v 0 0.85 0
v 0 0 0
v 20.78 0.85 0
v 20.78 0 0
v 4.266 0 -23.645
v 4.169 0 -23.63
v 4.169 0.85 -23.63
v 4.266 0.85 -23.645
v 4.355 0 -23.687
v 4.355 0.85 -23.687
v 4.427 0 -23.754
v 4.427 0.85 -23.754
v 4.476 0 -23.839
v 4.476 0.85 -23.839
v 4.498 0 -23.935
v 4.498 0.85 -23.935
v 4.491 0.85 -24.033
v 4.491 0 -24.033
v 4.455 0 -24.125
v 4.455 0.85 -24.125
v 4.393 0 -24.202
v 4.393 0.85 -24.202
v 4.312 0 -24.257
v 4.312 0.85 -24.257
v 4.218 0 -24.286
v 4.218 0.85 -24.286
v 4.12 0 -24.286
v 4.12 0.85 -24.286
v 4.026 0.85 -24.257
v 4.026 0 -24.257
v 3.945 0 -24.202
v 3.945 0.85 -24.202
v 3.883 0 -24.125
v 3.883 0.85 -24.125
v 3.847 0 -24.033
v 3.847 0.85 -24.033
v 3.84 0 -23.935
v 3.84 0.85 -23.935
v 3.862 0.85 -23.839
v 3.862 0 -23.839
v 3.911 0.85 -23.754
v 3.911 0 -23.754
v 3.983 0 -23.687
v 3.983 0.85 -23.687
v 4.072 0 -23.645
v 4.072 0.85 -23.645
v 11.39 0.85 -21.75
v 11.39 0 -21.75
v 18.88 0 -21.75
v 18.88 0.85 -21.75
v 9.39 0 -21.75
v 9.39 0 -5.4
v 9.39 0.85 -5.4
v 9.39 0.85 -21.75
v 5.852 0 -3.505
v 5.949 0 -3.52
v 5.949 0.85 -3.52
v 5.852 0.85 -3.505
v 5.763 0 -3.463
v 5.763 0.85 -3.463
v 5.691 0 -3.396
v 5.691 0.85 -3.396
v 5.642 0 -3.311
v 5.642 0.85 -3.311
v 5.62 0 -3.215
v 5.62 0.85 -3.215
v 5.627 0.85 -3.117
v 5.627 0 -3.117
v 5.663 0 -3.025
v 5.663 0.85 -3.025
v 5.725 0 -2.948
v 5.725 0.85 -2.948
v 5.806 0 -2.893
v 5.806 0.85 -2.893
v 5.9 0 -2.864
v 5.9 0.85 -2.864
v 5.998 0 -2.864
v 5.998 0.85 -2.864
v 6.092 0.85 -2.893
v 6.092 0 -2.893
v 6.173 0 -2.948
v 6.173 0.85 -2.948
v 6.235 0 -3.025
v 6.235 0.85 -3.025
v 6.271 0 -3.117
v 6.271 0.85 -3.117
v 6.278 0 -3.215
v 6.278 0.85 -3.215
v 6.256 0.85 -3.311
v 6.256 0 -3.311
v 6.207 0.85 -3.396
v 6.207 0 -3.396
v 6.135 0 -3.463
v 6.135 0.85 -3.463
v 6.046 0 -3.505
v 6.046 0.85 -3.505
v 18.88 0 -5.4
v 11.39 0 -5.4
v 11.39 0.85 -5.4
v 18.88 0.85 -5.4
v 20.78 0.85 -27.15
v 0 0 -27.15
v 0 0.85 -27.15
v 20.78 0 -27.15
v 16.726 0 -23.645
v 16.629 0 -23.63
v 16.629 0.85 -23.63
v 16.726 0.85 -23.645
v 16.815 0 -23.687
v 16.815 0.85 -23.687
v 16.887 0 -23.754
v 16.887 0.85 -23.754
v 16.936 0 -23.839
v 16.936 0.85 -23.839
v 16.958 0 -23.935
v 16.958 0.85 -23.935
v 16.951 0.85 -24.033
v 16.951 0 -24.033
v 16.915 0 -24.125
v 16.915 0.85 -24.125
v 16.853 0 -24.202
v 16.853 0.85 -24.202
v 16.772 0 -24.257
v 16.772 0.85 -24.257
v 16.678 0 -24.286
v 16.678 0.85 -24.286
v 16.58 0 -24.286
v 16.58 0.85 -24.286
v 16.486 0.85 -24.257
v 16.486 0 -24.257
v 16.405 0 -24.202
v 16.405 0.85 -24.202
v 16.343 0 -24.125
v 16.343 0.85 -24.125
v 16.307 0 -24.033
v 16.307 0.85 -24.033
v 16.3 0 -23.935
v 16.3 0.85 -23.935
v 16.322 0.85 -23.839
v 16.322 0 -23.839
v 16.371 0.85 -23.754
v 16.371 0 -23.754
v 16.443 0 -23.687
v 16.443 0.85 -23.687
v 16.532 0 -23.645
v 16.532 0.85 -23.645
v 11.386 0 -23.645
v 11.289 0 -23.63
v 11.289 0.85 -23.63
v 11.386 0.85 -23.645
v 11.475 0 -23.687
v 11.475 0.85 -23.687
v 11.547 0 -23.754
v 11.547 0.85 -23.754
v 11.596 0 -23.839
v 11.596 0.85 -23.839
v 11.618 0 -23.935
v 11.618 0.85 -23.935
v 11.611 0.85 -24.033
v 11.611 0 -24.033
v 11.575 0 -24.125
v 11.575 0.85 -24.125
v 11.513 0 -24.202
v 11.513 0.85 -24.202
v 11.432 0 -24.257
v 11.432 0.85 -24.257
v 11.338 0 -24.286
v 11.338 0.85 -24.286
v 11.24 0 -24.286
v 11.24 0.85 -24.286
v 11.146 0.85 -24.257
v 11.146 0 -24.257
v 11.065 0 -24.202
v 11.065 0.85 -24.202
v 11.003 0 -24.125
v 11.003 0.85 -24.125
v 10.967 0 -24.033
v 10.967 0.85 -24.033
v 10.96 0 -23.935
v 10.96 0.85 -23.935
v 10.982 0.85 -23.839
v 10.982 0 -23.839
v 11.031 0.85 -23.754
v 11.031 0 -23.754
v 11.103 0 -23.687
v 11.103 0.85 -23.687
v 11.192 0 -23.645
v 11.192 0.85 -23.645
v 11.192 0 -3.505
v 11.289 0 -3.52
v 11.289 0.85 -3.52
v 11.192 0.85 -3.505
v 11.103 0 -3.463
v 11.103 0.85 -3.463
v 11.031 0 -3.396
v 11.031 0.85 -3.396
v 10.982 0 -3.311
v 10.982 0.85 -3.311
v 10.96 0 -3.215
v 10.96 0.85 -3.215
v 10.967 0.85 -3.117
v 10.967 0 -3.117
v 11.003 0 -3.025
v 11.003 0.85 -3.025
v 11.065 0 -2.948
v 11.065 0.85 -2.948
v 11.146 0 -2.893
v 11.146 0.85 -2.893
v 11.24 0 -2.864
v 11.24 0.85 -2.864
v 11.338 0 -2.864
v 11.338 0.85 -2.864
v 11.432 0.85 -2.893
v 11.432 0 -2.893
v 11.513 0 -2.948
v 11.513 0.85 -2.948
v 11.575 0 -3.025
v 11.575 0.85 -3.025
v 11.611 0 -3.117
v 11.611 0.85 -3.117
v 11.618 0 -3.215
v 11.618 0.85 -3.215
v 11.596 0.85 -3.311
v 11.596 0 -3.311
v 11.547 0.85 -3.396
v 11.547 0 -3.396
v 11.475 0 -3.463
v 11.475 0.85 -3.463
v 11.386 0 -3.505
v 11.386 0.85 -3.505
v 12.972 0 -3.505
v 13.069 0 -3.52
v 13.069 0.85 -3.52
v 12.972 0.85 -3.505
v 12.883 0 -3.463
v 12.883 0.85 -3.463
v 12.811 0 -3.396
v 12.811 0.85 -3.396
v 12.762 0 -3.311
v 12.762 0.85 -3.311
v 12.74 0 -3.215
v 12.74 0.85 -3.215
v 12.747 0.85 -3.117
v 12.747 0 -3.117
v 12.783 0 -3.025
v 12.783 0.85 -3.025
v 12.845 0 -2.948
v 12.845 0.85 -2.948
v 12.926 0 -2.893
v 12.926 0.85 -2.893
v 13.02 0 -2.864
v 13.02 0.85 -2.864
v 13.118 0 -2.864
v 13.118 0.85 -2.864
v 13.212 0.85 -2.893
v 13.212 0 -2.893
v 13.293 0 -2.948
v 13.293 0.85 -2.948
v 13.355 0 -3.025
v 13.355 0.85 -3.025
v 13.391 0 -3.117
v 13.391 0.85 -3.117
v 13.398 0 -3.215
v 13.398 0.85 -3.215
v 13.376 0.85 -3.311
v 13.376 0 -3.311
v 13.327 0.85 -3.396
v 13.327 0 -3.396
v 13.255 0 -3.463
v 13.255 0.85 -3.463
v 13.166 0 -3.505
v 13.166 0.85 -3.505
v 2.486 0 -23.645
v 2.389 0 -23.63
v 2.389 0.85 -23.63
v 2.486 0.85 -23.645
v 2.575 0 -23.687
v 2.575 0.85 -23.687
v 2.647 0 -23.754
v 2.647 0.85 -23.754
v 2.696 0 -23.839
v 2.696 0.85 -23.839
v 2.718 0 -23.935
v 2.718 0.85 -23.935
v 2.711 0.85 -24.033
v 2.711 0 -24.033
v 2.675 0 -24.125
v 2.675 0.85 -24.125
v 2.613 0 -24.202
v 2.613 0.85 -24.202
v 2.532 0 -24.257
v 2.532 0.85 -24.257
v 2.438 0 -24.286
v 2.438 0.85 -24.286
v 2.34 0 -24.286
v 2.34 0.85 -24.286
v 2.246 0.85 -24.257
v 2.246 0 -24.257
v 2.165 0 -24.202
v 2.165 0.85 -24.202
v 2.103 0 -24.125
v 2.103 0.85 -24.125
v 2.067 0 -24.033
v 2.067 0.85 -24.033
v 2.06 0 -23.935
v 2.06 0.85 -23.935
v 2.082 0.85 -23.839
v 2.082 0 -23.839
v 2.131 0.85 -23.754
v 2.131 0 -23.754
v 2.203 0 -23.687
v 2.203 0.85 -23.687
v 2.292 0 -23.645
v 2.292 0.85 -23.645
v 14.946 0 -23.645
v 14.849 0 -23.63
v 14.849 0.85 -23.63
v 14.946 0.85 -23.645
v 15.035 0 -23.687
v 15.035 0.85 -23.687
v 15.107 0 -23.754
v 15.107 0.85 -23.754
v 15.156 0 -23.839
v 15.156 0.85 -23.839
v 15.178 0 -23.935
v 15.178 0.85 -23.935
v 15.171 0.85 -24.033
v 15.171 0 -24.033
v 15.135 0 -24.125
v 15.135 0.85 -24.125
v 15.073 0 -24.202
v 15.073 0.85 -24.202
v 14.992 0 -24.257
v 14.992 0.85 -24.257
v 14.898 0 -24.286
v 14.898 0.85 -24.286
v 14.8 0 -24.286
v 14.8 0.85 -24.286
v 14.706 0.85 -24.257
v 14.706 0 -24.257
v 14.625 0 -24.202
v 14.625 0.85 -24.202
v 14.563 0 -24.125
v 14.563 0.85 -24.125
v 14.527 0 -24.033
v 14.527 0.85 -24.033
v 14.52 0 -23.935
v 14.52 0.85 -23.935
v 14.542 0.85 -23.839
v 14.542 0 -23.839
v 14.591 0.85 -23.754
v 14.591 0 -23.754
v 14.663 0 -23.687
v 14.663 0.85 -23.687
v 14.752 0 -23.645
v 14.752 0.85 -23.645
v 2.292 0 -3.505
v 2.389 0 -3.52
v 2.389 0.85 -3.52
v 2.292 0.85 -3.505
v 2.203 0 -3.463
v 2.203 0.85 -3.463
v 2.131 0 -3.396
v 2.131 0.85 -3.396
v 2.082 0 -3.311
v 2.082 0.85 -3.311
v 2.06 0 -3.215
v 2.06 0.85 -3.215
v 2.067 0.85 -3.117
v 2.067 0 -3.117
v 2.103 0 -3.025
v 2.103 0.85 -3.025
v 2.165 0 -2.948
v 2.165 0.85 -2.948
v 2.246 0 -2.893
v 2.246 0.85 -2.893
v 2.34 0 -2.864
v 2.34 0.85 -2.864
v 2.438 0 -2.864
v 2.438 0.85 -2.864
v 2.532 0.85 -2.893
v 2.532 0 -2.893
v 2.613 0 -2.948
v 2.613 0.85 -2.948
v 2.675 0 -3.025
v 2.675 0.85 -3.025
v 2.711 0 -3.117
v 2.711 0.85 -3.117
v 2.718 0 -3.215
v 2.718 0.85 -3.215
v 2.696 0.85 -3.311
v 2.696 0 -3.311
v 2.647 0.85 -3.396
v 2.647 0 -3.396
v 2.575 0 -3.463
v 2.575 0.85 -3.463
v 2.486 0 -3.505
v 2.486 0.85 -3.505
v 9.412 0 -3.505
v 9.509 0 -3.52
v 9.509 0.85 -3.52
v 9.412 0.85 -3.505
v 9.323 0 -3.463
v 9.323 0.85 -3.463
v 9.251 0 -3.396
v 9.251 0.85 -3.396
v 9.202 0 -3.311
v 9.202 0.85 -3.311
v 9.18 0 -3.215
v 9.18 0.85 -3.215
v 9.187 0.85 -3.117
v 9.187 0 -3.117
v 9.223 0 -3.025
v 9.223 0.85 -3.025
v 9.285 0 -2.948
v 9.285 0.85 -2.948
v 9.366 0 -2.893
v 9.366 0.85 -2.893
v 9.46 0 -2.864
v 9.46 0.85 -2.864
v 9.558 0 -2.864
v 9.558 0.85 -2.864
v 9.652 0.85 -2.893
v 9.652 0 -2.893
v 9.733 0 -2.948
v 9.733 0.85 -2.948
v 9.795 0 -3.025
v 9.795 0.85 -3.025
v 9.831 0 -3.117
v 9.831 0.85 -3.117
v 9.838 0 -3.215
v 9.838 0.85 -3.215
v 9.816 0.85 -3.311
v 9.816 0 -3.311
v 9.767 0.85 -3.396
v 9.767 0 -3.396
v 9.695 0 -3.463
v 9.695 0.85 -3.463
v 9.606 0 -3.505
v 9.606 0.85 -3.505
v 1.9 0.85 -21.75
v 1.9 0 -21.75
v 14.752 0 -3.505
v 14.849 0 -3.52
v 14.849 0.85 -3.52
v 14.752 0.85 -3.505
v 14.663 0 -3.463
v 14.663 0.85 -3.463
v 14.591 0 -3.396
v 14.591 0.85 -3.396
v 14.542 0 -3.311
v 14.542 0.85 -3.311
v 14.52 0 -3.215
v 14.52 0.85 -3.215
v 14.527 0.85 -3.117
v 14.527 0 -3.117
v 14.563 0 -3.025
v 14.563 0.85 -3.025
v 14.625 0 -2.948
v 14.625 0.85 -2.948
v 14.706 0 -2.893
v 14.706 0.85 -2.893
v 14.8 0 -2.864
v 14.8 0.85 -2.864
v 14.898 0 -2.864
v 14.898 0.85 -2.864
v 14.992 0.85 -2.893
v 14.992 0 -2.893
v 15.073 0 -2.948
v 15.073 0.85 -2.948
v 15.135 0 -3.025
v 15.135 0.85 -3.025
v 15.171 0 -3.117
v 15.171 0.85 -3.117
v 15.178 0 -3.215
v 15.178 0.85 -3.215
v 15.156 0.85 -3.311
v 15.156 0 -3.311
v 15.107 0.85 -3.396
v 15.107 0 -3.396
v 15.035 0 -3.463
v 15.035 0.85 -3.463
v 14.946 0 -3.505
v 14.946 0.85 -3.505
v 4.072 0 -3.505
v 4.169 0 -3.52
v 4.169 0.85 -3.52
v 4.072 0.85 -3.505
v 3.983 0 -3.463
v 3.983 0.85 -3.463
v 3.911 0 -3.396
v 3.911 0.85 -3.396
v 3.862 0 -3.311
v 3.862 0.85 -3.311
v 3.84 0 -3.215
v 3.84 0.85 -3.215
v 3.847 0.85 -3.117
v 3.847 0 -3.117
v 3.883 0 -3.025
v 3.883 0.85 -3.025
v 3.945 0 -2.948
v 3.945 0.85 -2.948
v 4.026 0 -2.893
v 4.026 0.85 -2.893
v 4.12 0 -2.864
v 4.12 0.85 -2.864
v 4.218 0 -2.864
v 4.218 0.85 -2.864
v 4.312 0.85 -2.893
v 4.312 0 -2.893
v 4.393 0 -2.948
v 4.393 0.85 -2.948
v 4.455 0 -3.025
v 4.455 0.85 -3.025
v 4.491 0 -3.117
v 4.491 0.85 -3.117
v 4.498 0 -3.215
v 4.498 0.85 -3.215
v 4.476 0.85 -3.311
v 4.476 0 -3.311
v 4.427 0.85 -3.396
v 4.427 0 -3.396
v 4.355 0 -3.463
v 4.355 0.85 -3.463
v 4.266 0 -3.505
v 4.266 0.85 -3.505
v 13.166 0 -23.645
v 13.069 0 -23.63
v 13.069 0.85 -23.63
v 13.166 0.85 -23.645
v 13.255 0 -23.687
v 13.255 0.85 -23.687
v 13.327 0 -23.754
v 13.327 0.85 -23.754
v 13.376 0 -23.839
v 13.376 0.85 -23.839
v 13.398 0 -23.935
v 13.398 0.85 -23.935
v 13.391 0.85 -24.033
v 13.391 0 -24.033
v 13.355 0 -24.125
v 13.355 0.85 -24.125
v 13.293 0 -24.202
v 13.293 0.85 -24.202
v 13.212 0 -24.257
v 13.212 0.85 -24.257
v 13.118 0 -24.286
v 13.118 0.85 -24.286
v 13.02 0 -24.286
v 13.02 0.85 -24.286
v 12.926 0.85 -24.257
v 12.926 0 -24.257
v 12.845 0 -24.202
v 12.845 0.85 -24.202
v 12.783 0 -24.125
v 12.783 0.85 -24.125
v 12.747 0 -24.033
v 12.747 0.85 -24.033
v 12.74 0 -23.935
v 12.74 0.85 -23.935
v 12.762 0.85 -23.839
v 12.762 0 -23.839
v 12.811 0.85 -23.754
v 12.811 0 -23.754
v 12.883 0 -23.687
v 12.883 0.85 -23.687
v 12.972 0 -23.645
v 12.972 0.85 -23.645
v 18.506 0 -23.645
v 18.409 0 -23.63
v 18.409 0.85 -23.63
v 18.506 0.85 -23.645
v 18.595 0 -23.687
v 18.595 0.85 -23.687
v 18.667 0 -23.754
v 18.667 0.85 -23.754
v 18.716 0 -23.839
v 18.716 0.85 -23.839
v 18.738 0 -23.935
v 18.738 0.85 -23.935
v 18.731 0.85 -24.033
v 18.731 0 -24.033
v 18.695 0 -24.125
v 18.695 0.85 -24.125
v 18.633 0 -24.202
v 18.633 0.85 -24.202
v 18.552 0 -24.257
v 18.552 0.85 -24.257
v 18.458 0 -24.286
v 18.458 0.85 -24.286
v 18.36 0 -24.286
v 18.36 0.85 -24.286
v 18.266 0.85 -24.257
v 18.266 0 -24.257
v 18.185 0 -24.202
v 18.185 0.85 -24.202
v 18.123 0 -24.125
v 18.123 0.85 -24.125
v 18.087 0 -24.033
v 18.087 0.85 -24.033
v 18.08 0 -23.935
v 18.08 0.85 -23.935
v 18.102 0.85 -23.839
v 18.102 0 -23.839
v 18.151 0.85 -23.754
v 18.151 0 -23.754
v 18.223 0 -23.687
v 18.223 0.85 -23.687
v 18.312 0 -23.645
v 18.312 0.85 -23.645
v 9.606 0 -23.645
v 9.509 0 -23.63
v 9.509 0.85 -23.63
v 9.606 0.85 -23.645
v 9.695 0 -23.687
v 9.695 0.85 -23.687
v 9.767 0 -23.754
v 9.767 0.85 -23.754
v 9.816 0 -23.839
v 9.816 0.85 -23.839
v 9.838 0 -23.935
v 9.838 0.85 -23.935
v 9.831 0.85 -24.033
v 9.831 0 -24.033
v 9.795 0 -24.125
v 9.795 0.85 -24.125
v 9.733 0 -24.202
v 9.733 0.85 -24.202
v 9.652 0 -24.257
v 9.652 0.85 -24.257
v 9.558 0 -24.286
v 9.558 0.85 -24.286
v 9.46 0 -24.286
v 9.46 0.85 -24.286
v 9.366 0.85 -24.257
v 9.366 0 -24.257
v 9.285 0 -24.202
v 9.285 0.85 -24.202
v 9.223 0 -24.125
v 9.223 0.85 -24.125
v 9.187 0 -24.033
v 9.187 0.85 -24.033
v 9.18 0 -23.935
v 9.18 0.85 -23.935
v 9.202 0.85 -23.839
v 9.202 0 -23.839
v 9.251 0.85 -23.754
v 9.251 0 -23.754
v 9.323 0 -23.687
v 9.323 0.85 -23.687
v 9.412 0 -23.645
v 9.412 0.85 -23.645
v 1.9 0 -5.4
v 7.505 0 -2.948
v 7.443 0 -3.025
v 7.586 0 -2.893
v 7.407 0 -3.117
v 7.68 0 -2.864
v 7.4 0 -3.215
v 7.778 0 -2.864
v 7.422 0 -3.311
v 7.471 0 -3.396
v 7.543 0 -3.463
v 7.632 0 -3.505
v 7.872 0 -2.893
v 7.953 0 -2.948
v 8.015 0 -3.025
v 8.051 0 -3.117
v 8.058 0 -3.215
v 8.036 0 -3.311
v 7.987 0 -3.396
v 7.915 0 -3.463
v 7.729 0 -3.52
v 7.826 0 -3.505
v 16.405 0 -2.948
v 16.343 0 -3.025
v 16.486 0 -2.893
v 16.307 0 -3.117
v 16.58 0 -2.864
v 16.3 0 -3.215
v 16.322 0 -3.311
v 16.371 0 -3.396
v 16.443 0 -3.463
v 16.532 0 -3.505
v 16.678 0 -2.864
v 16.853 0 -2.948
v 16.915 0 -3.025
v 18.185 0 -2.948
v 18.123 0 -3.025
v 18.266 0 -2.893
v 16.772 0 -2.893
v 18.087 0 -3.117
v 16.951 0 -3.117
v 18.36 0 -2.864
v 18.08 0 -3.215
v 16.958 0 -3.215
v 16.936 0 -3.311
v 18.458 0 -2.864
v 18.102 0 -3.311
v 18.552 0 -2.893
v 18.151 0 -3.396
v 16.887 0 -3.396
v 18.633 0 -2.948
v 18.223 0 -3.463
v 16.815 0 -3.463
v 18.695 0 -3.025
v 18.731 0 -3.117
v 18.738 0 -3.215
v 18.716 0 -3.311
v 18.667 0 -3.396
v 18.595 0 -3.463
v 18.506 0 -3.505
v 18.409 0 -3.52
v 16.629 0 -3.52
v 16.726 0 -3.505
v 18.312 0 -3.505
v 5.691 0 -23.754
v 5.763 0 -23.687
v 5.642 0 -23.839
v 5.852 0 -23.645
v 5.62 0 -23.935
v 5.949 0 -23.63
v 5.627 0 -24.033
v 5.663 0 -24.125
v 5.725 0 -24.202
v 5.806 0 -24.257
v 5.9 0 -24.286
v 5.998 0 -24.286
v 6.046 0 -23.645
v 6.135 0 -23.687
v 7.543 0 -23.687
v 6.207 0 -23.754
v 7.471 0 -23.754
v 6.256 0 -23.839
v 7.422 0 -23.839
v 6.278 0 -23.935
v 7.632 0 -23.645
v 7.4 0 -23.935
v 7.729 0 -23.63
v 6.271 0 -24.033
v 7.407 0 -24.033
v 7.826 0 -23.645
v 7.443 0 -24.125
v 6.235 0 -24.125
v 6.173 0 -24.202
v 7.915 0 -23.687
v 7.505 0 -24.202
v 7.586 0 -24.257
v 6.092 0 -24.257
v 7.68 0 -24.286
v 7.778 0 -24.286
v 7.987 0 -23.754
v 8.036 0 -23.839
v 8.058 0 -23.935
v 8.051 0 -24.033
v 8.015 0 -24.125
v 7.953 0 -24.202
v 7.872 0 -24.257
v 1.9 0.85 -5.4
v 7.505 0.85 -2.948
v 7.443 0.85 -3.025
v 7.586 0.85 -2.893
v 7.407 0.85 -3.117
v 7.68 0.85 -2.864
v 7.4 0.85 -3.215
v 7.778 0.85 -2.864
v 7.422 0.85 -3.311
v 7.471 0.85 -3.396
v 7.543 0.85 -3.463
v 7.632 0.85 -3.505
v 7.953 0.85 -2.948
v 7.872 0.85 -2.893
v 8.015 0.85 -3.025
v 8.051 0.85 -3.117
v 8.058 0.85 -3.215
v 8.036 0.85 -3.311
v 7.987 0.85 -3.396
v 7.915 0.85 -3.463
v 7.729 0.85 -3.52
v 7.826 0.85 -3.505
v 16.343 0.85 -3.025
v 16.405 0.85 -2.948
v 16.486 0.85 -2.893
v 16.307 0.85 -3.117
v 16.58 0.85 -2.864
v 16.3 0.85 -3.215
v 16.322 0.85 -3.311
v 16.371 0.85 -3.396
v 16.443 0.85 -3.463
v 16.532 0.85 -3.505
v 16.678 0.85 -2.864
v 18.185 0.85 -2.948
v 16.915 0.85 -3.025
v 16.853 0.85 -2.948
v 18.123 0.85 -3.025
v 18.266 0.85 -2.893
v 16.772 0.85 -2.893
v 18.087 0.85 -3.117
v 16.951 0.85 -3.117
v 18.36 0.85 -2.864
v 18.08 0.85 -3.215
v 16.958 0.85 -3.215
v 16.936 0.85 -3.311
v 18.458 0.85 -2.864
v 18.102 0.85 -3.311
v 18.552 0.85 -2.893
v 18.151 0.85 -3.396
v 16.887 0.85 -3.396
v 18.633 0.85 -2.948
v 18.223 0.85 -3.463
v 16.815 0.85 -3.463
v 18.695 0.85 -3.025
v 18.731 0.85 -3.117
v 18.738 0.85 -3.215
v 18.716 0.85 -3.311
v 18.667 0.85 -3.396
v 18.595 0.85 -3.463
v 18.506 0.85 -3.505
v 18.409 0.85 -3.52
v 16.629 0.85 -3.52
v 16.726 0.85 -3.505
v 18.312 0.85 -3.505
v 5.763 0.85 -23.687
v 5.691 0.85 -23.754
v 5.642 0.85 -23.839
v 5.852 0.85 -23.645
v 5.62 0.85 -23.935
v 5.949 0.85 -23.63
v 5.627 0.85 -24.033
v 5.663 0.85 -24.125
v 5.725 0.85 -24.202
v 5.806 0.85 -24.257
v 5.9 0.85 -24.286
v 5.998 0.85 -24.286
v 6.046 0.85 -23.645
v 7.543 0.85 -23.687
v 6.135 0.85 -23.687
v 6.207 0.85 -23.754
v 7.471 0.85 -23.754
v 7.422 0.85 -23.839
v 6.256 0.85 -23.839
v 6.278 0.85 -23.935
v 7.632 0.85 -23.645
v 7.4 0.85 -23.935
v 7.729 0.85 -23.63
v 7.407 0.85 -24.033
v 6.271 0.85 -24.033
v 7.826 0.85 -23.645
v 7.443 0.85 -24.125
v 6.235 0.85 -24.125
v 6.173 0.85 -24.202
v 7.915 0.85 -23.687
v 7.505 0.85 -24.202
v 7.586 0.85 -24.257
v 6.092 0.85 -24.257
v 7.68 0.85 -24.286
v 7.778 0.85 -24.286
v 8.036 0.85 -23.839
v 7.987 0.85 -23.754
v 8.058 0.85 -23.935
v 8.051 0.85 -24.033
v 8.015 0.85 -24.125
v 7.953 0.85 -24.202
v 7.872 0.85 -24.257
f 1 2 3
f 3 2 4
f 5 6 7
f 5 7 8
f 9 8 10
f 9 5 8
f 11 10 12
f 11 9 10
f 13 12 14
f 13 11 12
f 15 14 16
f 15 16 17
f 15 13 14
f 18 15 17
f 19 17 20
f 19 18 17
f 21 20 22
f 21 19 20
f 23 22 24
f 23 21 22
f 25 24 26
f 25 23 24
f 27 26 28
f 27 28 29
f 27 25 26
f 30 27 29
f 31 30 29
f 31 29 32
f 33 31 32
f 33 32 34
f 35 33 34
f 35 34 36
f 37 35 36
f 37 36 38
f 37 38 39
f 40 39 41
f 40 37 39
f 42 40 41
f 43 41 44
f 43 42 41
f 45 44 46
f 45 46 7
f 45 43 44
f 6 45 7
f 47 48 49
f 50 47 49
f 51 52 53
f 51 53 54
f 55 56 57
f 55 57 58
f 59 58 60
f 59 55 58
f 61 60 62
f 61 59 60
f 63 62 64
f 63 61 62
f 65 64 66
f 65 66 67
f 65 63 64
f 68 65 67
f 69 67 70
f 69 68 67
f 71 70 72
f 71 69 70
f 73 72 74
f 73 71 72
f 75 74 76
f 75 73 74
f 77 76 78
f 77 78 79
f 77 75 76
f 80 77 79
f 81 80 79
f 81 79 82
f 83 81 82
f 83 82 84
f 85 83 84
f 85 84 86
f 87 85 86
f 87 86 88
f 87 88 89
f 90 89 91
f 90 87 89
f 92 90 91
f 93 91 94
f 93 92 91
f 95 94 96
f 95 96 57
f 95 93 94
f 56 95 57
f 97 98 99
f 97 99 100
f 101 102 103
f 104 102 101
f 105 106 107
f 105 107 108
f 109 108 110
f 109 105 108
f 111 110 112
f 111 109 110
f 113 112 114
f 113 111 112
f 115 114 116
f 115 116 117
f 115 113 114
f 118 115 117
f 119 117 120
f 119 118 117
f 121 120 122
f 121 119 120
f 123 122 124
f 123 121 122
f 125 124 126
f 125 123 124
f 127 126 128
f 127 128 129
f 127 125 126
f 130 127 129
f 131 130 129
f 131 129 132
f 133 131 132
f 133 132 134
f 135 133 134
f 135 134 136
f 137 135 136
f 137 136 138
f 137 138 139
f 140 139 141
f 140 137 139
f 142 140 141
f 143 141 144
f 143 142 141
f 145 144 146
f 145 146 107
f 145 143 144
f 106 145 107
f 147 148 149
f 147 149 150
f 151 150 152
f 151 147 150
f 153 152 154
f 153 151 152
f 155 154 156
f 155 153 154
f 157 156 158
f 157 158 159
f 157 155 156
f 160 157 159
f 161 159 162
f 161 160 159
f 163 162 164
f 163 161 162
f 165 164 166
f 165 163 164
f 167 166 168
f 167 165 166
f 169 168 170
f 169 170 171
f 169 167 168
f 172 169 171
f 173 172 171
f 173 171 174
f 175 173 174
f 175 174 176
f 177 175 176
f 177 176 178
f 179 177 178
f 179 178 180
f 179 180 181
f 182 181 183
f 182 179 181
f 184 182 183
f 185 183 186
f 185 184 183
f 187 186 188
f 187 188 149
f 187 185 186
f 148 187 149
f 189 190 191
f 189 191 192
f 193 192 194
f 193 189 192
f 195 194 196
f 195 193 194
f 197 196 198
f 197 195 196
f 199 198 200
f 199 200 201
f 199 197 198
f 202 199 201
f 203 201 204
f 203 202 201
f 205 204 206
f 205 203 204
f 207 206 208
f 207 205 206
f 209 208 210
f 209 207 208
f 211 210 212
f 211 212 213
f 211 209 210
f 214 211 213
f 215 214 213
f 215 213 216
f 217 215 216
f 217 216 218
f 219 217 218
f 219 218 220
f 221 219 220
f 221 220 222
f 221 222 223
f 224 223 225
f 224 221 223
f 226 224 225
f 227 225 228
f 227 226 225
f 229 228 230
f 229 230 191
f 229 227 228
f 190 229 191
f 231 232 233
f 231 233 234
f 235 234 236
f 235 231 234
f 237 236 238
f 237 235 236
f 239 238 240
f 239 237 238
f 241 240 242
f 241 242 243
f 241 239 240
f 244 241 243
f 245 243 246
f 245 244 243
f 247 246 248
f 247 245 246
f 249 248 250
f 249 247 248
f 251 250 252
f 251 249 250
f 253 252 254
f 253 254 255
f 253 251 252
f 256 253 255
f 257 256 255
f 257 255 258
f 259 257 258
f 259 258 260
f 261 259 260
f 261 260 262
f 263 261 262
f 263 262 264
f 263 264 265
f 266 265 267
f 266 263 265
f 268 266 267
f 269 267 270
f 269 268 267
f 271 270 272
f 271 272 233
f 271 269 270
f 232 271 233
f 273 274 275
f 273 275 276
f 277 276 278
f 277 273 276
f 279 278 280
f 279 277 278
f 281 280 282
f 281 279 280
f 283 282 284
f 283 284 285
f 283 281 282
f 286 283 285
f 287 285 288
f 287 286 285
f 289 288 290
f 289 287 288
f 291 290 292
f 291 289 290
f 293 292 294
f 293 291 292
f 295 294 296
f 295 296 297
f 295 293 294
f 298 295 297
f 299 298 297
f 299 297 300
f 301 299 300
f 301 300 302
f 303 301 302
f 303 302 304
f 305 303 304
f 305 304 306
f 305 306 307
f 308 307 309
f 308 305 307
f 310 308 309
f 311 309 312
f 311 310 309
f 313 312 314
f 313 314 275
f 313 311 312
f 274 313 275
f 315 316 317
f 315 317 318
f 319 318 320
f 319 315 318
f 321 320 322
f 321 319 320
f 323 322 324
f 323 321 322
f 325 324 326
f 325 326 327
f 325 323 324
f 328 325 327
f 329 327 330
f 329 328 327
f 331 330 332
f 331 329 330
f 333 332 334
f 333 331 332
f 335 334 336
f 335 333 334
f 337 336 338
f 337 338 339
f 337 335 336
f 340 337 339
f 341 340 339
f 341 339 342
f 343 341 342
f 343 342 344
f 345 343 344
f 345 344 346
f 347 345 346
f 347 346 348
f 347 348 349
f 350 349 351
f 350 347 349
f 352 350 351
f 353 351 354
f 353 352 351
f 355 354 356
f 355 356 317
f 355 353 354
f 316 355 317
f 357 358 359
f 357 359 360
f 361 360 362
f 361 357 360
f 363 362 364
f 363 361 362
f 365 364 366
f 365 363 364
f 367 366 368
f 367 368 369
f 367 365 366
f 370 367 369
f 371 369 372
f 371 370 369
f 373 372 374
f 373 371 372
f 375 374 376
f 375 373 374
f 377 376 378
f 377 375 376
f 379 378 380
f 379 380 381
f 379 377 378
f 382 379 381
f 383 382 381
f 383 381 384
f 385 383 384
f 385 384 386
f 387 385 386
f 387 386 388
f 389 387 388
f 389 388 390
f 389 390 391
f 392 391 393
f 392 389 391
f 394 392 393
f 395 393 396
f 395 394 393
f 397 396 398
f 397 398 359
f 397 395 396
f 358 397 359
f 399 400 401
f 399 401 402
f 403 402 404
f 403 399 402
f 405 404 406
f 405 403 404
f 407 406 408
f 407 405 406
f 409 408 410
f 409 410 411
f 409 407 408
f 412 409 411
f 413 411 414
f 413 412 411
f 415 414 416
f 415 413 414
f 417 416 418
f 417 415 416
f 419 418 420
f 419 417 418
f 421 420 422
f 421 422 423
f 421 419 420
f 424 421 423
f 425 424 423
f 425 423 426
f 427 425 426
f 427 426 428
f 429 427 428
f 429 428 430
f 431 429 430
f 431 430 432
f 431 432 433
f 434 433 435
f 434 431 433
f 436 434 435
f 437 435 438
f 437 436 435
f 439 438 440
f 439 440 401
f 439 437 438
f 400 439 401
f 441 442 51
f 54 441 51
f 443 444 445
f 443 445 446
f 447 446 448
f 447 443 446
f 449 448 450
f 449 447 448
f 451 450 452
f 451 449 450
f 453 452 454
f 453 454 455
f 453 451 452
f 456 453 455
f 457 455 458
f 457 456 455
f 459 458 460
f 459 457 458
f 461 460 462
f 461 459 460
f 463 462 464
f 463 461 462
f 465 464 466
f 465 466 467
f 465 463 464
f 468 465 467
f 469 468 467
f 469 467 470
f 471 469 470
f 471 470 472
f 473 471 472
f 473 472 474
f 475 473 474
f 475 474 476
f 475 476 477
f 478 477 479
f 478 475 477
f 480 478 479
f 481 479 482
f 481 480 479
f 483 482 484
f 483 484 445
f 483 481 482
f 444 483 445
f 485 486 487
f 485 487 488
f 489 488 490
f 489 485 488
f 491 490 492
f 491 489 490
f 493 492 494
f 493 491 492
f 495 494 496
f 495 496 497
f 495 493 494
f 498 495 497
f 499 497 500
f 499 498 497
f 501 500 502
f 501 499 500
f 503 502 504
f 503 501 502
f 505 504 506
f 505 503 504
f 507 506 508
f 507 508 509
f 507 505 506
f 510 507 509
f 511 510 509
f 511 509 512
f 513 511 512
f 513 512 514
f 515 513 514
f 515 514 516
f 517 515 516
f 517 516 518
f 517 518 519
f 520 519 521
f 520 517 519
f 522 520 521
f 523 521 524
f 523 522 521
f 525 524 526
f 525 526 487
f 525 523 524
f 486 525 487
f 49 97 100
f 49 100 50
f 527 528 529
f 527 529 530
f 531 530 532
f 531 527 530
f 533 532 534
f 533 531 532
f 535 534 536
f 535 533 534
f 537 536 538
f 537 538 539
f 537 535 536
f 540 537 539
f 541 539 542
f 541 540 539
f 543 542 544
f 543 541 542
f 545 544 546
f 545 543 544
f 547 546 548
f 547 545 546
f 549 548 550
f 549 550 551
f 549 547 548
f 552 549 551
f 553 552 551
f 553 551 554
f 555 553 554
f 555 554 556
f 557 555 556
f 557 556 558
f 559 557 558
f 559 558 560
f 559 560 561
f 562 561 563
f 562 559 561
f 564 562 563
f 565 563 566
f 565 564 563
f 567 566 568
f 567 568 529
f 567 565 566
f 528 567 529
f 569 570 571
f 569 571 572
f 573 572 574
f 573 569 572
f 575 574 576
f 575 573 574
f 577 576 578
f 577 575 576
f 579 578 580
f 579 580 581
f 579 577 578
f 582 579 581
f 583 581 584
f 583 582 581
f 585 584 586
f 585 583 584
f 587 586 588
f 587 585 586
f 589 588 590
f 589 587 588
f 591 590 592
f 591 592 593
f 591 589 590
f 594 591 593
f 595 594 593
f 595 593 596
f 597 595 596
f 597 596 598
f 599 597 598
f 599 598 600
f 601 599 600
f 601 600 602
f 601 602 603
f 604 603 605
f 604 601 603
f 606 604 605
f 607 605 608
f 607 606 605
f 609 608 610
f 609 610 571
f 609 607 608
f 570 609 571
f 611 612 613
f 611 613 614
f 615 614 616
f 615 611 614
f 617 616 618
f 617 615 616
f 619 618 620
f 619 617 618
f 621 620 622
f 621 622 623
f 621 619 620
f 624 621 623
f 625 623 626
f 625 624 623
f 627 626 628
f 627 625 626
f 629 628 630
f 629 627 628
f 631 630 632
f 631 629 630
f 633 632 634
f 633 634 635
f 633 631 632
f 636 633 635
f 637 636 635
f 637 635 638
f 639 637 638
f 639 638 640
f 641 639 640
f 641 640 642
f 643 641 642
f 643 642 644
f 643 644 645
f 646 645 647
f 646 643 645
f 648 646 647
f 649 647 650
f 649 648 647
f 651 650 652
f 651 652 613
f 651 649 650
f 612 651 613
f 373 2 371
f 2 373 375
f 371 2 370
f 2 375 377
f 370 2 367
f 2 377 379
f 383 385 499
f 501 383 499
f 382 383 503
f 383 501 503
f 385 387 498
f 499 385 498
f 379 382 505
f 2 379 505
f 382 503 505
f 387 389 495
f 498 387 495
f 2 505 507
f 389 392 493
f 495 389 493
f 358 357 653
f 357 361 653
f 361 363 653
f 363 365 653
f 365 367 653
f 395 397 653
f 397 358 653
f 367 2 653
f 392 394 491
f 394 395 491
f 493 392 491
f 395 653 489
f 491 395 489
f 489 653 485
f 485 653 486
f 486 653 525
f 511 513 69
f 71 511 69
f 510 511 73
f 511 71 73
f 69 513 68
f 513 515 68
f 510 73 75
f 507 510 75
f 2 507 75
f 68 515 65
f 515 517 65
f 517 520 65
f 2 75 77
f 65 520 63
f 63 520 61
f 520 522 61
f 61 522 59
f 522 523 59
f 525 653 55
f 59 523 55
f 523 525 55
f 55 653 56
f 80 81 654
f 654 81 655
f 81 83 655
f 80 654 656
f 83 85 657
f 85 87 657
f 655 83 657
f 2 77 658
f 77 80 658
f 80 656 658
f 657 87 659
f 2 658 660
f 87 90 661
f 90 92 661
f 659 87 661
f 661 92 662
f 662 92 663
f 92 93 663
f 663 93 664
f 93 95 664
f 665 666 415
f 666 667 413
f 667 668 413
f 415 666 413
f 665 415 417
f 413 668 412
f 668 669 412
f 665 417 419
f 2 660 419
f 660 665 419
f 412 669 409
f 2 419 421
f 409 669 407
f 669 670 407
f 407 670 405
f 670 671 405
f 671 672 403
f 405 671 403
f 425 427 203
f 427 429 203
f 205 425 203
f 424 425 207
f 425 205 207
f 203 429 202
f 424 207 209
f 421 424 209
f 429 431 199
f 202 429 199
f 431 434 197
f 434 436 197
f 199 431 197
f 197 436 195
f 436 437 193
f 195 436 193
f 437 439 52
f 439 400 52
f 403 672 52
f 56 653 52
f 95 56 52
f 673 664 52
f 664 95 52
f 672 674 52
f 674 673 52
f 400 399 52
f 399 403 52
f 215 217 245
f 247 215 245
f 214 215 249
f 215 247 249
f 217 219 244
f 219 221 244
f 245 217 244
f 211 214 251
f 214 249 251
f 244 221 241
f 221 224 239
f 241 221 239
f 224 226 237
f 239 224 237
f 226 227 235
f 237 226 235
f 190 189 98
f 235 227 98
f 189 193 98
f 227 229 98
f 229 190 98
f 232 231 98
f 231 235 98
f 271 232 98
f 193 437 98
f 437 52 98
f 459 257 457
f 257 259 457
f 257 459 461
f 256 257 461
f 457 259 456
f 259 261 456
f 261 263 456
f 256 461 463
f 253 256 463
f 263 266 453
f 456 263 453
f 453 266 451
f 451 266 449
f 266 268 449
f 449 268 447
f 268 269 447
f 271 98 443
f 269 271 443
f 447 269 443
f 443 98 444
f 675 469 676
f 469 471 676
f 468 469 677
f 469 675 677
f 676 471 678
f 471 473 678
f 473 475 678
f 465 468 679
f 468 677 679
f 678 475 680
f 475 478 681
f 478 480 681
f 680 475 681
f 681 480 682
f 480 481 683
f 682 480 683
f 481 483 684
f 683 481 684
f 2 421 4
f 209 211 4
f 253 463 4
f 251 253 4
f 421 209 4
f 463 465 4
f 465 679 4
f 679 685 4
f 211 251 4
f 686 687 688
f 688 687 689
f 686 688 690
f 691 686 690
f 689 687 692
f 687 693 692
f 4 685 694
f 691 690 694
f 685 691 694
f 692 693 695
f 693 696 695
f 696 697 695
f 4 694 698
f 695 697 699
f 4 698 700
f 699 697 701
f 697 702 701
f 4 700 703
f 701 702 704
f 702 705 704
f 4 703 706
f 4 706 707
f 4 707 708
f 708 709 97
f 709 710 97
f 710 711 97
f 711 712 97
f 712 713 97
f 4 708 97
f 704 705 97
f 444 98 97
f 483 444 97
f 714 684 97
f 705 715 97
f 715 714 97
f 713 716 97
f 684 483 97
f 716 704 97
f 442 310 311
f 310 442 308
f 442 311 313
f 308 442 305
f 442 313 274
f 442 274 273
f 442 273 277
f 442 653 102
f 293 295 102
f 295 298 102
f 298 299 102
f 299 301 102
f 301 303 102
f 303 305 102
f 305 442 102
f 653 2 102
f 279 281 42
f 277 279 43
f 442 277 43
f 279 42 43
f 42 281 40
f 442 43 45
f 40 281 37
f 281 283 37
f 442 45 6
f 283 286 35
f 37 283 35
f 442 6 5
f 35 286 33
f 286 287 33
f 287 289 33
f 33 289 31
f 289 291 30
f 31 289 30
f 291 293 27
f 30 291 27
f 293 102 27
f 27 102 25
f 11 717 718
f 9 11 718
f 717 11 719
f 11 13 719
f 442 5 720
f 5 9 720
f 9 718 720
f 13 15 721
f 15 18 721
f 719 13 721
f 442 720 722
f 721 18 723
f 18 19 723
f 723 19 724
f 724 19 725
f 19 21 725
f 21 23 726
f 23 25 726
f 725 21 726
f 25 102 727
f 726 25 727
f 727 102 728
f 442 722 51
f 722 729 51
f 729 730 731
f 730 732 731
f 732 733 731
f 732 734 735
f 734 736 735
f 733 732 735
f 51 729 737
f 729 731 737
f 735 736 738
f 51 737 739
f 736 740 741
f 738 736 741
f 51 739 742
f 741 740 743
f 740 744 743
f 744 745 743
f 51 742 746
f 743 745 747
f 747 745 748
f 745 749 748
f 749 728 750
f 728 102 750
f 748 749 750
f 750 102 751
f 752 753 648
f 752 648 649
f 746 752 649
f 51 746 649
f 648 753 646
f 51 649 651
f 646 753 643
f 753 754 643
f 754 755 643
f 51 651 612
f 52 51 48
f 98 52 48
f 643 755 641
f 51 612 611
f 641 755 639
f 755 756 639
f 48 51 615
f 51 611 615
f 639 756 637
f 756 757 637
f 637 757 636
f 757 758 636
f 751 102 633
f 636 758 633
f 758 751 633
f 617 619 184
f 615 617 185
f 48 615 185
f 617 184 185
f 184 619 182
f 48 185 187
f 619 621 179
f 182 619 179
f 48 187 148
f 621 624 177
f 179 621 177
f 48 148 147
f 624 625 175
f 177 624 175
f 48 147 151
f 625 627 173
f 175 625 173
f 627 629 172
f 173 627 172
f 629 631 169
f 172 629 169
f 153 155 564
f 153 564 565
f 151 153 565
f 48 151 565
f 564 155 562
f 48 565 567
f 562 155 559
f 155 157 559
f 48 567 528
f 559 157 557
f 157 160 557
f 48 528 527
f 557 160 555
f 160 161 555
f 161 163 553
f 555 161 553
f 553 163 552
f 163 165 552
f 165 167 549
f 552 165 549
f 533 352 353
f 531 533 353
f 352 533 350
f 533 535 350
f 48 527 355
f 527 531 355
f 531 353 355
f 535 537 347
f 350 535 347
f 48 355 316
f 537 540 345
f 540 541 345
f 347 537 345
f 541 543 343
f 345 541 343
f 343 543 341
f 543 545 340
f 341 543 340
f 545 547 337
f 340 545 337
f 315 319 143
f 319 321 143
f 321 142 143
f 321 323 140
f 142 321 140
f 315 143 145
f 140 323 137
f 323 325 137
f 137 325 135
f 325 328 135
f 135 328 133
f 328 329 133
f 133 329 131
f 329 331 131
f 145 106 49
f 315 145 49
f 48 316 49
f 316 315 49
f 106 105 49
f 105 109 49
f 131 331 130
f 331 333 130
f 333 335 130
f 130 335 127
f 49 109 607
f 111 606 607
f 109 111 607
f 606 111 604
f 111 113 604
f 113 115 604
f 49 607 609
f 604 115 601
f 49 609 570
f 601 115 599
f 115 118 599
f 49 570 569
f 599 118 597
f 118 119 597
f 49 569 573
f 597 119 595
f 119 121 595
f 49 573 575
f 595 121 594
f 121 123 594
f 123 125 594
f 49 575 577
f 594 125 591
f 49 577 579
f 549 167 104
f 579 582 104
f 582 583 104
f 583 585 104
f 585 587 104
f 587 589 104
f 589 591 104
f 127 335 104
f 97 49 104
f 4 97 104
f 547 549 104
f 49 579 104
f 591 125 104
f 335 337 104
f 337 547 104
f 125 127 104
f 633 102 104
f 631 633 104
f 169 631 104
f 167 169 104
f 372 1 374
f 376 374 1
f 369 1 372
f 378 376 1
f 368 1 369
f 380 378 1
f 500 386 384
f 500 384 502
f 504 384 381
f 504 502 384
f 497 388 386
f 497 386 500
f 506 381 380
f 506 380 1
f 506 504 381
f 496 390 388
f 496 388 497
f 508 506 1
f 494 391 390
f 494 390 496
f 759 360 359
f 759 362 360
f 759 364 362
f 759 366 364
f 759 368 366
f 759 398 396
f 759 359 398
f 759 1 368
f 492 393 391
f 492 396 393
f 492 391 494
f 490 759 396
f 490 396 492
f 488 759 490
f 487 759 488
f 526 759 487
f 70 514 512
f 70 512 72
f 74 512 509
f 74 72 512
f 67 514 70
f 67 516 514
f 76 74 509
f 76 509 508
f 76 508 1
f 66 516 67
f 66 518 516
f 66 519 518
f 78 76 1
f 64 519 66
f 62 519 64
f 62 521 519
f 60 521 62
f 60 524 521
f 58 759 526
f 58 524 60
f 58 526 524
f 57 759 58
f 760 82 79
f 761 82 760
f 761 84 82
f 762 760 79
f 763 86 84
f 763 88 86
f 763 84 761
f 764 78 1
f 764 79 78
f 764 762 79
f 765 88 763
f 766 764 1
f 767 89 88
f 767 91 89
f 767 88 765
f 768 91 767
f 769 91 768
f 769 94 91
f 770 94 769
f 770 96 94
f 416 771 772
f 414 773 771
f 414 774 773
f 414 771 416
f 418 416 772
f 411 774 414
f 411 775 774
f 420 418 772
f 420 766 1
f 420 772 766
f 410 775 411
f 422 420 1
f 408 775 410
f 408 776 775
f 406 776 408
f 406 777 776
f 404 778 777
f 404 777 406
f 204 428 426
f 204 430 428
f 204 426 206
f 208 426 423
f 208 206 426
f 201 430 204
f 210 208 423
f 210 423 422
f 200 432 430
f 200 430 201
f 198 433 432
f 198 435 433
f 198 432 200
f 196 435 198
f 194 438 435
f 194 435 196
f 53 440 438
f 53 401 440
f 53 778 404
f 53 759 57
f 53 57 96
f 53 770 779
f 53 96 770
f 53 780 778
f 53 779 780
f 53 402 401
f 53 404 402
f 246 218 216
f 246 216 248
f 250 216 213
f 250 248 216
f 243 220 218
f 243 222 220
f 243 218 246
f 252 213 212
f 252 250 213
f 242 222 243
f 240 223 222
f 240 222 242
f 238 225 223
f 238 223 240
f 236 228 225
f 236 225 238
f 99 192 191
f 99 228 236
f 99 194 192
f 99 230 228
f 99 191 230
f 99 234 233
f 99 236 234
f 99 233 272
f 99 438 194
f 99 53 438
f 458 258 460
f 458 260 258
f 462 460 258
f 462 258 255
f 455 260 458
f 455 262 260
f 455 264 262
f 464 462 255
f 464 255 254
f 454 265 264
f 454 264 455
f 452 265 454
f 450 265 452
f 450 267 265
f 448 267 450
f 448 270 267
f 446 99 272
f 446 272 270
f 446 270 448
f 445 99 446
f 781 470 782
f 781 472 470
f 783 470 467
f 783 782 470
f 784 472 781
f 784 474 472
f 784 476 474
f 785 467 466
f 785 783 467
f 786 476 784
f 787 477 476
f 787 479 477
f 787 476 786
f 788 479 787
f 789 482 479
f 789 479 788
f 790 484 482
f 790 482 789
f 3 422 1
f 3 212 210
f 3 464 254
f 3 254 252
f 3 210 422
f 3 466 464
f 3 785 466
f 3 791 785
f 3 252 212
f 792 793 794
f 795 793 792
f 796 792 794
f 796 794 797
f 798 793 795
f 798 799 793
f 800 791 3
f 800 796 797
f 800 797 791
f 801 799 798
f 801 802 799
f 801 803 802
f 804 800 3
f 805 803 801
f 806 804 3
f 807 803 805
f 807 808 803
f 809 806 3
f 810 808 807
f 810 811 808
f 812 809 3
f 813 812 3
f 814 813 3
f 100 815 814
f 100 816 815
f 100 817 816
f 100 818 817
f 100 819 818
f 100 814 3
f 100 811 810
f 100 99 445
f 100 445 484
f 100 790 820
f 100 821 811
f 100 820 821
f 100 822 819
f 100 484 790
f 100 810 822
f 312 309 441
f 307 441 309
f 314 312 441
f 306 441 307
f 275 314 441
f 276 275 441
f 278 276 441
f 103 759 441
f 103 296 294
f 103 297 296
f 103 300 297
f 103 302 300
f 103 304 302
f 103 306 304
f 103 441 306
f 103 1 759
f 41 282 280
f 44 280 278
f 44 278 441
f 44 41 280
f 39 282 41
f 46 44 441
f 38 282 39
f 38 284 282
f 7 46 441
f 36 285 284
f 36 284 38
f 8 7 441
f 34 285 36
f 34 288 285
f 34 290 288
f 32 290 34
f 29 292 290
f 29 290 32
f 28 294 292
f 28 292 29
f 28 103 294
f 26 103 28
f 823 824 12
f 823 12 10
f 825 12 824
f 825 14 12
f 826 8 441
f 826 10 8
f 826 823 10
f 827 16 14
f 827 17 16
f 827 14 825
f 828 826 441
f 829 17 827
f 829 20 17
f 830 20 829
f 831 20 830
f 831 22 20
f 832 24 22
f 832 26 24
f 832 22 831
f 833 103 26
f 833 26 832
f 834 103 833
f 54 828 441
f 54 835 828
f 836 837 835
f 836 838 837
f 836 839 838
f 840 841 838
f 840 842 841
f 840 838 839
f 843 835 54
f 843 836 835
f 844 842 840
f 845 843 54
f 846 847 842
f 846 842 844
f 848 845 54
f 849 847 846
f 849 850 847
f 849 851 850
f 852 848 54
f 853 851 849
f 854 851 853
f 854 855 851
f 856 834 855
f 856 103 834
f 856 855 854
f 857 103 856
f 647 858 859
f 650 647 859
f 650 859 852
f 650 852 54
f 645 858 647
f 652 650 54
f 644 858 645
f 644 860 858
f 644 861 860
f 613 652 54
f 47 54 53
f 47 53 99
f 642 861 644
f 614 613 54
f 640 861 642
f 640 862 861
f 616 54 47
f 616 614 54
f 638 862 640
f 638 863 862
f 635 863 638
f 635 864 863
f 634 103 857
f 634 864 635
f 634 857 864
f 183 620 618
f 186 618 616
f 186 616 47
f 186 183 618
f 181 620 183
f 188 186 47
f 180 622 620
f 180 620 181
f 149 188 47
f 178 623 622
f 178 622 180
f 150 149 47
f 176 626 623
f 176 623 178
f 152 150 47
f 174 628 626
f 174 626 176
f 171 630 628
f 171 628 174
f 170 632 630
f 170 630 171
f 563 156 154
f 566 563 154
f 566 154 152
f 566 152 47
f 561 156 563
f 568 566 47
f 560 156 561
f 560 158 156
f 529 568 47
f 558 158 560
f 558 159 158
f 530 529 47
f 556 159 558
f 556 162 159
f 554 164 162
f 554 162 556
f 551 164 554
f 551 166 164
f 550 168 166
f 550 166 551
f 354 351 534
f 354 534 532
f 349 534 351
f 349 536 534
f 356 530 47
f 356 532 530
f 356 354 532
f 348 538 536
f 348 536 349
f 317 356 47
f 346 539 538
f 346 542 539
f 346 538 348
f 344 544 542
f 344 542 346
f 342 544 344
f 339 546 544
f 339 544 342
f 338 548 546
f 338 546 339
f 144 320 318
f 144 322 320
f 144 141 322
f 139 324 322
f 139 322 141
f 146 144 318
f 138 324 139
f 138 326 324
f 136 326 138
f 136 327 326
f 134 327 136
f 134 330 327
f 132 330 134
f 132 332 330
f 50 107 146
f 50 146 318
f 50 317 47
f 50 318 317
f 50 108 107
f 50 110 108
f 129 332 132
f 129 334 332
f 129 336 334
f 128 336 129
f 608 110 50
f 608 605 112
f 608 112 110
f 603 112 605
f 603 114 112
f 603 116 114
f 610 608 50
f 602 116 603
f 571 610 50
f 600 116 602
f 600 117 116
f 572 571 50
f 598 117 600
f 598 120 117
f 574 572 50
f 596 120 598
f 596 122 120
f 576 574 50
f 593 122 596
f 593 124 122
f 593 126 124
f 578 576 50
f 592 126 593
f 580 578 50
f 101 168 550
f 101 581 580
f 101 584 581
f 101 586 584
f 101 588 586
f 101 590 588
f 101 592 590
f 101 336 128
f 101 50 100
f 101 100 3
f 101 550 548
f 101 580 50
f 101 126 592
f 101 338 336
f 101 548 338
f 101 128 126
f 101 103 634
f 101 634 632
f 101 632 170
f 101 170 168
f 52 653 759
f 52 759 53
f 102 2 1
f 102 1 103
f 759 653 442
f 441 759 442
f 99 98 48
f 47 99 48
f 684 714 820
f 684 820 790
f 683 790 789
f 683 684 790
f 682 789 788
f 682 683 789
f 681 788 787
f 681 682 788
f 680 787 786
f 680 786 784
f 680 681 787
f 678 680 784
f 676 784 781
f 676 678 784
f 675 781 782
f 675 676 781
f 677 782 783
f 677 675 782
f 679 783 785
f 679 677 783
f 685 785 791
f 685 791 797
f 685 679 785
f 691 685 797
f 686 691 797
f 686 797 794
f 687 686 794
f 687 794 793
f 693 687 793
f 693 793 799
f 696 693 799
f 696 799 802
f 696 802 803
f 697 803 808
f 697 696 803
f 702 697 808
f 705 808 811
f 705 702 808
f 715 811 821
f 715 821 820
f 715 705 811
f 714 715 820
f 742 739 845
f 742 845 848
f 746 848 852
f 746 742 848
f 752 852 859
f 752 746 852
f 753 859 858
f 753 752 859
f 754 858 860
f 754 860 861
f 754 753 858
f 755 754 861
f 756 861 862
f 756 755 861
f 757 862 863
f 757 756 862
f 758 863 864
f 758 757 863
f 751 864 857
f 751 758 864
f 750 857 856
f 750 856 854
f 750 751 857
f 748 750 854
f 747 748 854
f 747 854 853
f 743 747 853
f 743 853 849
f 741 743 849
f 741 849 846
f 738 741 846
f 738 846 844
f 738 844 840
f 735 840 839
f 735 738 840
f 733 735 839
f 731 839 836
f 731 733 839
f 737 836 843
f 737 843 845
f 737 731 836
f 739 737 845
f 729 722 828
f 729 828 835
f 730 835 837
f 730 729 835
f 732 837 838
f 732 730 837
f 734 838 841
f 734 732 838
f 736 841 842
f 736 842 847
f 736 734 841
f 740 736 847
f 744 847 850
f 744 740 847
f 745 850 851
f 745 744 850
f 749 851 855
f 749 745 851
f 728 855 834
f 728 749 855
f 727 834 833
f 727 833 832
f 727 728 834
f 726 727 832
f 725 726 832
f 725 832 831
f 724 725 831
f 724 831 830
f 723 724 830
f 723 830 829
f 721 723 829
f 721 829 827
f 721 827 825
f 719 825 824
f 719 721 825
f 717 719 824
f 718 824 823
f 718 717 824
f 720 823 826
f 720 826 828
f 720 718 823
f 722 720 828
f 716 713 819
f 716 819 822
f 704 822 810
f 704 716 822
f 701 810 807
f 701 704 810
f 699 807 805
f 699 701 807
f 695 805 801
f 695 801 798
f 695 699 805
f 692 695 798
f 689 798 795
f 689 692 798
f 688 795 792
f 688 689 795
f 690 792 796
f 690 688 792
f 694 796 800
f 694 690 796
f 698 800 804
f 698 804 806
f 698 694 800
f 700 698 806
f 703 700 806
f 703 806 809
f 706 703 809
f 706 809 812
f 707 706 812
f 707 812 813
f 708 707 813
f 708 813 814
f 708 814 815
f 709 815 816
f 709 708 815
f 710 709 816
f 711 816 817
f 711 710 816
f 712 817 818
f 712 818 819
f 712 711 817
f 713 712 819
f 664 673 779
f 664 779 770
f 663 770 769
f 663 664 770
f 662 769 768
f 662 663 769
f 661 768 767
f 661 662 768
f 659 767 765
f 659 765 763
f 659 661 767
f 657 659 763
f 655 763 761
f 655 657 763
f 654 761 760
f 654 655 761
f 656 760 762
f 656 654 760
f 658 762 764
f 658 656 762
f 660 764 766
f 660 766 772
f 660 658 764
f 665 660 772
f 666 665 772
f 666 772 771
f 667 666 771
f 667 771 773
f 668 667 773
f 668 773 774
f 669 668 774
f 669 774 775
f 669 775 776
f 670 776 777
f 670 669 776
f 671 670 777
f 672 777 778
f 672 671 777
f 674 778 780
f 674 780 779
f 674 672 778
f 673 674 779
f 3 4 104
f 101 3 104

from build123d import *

# Parameters (mm, degrees)
SKETCH1_W           = 20.78
SKETCH1_H           = 27.15
SKETCH1_R           = 0.33
SKETCH1_W_2         = 7.49
SKETCH1_H_2         = 16.35
BOSS_EXTRUDE1_DEPTH = 0.85


with BuildPart() as part:
    # Sketch1 → Boss-Extrude1 (new body)
    with BuildSketch(Plane(origin=(0, 0, 0), x_dir=(1, 0, 0), z_dir=(0, 1, 0))):
        with Locations((10.39, 13.575)):
            Rectangle(SKETCH1_W, SKETCH1_H)
        with Locations(Location((2.389, 23.96, 0), (0, 0, 270))):
            Circle(SKETCH1_R, mode=Mode.SUBTRACT)
        with Locations(Location((4.169, 23.96, 0), (0, 0, 270))):
            Circle(SKETCH1_R, mode=Mode.SUBTRACT)
        with Locations(Location((5.949, 23.96, 0), (0, 0, 270))):
            Circle(SKETCH1_R, mode=Mode.SUBTRACT)
        with Locations(Location((7.729, 23.96, 0), (0, 0, 270))):
            Circle(SKETCH1_R, mode=Mode.SUBTRACT)
        with Locations(Location((9.509, 23.96, 0), (0, 0, 270))):
            Circle(SKETCH1_R, mode=Mode.SUBTRACT)
        with Locations(Location((11.289, 23.96, 0), (0, 0, 270))):
            Circle(SKETCH1_R, mode=Mode.SUBTRACT)
        with Locations(Location((13.069, 23.96, 0), (0, 0, 270))):
            Circle(SKETCH1_R, mode=Mode.SUBTRACT)
        with Locations(Location((14.849, 23.96, 0), (0, 0, 270))):
            Circle(SKETCH1_R, mode=Mode.SUBTRACT)
        with Locations(Location((16.629, 23.96, 0), (0, 0, 270))):
            Circle(SKETCH1_R, mode=Mode.SUBTRACT)
        with Locations(Location((18.409, 23.96, 0), (0, 0, 270))):
            Circle(SKETCH1_R, mode=Mode.SUBTRACT)
        with Locations(Location((18.409, 3.19, 0), (0, 0, 90))):
            Circle(SKETCH1_R, mode=Mode.SUBTRACT)
        with Locations(Location((16.629, 3.19, 0), (0, 0, 90))):
            Circle(SKETCH1_R, mode=Mode.SUBTRACT)
        with Locations(Location((14.849, 3.19, 0), (0, 0, 90))):
            Circle(SKETCH1_R, mode=Mode.SUBTRACT)
        with Locations(Location((13.069, 3.19, 0), (0, 0, 90))):
            Circle(SKETCH1_R, mode=Mode.SUBTRACT)
        with Locations(Location((11.289, 3.19, 0), (0, 0, 90))):
            Circle(SKETCH1_R, mode=Mode.SUBTRACT)
        with Locations(Location((9.509, 3.19, 0), (0, 0, 90))):
            Circle(SKETCH1_R, mode=Mode.SUBTRACT)
        with Locations(Location((7.729, 3.19, 0), (0, 0, 90))):
            Circle(SKETCH1_R, mode=Mode.SUBTRACT)
        with Locations(Location((5.949, 3.19, 0), (0, 0, 90))):
            Circle(SKETCH1_R, mode=Mode.SUBTRACT)
        with Locations(Location((4.169, 3.19, 0), (0, 0, 90))):
            Circle(SKETCH1_R, mode=Mode.SUBTRACT)
        with Locations(Location((2.389, 3.19, 0), (0, 0, 90))):
            Circle(SKETCH1_R, mode=Mode.SUBTRACT)
        with Locations((15.135, 13.575)):
            Rectangle(SKETCH1_W_2, SKETCH1_H_2, mode=Mode.SUBTRACT)
        with Locations((5.645, 13.575)):
            Rectangle(SKETCH1_W_2, SKETCH1_H_2, mode=Mode.SUBTRACT)
    extrude(amount=BOSS_EXTRUDE1_DEPTH)


solid = part.part
